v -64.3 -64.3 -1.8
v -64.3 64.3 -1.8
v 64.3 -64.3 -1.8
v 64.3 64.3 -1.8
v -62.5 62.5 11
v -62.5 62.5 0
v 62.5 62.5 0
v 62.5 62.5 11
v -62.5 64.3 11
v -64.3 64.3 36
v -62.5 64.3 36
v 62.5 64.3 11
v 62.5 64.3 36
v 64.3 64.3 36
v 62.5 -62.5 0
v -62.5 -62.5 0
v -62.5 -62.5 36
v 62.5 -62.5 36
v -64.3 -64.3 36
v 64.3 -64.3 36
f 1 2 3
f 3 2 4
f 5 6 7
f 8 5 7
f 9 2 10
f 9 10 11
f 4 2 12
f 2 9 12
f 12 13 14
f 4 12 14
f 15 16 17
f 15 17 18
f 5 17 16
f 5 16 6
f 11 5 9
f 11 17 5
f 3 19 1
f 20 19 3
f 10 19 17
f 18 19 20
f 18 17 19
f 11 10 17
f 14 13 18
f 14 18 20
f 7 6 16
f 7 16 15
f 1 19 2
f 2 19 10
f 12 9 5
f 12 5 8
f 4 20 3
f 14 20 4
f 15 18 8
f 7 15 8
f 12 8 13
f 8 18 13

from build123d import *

# Parameters (mm, degrees)
F2_W     = 128.6
F2_H     = 128.6
F2_W_2   = 125
F2_H_2   = 125
F3_DEPTH = 36
F4_DEPTH = 1.8
F5_W     = 125
F5_H     = 1.8
F6_DEPTH = 25


with BuildPart() as f3:
    # F2 (on Top) → F3 (new body)
    with BuildSketch(Plane.XY):
        Rectangle(F2_W, F2_H)
        Rectangle(F2_W_2, F2_H_2, mode=Mode.SUBTRACT)
    extrude(amount=F3_DEPTH)

    # F2 (on Top) → F4 (join)
    with BuildSketch(Plane.XY):
        Rectangle(F2_W, F2_H)
        Rectangle(F2_W_2, F2_H_2, mode=Mode.SUBTRACT)
        Rectangle(F2_W_2, F2_H_2)
    extrude(amount=-F4_DEPTH)

    # F5 (on face) → F6 (cut)
    with BuildSketch(Plane.XY.offset(36)):
        with Locations((0, 63.4)):
            Rectangle(F5_W, F5_H)
    extrude(amount=-F6_DEPTH, mode=Mode.SUBTRACT)


solid = f3.part
